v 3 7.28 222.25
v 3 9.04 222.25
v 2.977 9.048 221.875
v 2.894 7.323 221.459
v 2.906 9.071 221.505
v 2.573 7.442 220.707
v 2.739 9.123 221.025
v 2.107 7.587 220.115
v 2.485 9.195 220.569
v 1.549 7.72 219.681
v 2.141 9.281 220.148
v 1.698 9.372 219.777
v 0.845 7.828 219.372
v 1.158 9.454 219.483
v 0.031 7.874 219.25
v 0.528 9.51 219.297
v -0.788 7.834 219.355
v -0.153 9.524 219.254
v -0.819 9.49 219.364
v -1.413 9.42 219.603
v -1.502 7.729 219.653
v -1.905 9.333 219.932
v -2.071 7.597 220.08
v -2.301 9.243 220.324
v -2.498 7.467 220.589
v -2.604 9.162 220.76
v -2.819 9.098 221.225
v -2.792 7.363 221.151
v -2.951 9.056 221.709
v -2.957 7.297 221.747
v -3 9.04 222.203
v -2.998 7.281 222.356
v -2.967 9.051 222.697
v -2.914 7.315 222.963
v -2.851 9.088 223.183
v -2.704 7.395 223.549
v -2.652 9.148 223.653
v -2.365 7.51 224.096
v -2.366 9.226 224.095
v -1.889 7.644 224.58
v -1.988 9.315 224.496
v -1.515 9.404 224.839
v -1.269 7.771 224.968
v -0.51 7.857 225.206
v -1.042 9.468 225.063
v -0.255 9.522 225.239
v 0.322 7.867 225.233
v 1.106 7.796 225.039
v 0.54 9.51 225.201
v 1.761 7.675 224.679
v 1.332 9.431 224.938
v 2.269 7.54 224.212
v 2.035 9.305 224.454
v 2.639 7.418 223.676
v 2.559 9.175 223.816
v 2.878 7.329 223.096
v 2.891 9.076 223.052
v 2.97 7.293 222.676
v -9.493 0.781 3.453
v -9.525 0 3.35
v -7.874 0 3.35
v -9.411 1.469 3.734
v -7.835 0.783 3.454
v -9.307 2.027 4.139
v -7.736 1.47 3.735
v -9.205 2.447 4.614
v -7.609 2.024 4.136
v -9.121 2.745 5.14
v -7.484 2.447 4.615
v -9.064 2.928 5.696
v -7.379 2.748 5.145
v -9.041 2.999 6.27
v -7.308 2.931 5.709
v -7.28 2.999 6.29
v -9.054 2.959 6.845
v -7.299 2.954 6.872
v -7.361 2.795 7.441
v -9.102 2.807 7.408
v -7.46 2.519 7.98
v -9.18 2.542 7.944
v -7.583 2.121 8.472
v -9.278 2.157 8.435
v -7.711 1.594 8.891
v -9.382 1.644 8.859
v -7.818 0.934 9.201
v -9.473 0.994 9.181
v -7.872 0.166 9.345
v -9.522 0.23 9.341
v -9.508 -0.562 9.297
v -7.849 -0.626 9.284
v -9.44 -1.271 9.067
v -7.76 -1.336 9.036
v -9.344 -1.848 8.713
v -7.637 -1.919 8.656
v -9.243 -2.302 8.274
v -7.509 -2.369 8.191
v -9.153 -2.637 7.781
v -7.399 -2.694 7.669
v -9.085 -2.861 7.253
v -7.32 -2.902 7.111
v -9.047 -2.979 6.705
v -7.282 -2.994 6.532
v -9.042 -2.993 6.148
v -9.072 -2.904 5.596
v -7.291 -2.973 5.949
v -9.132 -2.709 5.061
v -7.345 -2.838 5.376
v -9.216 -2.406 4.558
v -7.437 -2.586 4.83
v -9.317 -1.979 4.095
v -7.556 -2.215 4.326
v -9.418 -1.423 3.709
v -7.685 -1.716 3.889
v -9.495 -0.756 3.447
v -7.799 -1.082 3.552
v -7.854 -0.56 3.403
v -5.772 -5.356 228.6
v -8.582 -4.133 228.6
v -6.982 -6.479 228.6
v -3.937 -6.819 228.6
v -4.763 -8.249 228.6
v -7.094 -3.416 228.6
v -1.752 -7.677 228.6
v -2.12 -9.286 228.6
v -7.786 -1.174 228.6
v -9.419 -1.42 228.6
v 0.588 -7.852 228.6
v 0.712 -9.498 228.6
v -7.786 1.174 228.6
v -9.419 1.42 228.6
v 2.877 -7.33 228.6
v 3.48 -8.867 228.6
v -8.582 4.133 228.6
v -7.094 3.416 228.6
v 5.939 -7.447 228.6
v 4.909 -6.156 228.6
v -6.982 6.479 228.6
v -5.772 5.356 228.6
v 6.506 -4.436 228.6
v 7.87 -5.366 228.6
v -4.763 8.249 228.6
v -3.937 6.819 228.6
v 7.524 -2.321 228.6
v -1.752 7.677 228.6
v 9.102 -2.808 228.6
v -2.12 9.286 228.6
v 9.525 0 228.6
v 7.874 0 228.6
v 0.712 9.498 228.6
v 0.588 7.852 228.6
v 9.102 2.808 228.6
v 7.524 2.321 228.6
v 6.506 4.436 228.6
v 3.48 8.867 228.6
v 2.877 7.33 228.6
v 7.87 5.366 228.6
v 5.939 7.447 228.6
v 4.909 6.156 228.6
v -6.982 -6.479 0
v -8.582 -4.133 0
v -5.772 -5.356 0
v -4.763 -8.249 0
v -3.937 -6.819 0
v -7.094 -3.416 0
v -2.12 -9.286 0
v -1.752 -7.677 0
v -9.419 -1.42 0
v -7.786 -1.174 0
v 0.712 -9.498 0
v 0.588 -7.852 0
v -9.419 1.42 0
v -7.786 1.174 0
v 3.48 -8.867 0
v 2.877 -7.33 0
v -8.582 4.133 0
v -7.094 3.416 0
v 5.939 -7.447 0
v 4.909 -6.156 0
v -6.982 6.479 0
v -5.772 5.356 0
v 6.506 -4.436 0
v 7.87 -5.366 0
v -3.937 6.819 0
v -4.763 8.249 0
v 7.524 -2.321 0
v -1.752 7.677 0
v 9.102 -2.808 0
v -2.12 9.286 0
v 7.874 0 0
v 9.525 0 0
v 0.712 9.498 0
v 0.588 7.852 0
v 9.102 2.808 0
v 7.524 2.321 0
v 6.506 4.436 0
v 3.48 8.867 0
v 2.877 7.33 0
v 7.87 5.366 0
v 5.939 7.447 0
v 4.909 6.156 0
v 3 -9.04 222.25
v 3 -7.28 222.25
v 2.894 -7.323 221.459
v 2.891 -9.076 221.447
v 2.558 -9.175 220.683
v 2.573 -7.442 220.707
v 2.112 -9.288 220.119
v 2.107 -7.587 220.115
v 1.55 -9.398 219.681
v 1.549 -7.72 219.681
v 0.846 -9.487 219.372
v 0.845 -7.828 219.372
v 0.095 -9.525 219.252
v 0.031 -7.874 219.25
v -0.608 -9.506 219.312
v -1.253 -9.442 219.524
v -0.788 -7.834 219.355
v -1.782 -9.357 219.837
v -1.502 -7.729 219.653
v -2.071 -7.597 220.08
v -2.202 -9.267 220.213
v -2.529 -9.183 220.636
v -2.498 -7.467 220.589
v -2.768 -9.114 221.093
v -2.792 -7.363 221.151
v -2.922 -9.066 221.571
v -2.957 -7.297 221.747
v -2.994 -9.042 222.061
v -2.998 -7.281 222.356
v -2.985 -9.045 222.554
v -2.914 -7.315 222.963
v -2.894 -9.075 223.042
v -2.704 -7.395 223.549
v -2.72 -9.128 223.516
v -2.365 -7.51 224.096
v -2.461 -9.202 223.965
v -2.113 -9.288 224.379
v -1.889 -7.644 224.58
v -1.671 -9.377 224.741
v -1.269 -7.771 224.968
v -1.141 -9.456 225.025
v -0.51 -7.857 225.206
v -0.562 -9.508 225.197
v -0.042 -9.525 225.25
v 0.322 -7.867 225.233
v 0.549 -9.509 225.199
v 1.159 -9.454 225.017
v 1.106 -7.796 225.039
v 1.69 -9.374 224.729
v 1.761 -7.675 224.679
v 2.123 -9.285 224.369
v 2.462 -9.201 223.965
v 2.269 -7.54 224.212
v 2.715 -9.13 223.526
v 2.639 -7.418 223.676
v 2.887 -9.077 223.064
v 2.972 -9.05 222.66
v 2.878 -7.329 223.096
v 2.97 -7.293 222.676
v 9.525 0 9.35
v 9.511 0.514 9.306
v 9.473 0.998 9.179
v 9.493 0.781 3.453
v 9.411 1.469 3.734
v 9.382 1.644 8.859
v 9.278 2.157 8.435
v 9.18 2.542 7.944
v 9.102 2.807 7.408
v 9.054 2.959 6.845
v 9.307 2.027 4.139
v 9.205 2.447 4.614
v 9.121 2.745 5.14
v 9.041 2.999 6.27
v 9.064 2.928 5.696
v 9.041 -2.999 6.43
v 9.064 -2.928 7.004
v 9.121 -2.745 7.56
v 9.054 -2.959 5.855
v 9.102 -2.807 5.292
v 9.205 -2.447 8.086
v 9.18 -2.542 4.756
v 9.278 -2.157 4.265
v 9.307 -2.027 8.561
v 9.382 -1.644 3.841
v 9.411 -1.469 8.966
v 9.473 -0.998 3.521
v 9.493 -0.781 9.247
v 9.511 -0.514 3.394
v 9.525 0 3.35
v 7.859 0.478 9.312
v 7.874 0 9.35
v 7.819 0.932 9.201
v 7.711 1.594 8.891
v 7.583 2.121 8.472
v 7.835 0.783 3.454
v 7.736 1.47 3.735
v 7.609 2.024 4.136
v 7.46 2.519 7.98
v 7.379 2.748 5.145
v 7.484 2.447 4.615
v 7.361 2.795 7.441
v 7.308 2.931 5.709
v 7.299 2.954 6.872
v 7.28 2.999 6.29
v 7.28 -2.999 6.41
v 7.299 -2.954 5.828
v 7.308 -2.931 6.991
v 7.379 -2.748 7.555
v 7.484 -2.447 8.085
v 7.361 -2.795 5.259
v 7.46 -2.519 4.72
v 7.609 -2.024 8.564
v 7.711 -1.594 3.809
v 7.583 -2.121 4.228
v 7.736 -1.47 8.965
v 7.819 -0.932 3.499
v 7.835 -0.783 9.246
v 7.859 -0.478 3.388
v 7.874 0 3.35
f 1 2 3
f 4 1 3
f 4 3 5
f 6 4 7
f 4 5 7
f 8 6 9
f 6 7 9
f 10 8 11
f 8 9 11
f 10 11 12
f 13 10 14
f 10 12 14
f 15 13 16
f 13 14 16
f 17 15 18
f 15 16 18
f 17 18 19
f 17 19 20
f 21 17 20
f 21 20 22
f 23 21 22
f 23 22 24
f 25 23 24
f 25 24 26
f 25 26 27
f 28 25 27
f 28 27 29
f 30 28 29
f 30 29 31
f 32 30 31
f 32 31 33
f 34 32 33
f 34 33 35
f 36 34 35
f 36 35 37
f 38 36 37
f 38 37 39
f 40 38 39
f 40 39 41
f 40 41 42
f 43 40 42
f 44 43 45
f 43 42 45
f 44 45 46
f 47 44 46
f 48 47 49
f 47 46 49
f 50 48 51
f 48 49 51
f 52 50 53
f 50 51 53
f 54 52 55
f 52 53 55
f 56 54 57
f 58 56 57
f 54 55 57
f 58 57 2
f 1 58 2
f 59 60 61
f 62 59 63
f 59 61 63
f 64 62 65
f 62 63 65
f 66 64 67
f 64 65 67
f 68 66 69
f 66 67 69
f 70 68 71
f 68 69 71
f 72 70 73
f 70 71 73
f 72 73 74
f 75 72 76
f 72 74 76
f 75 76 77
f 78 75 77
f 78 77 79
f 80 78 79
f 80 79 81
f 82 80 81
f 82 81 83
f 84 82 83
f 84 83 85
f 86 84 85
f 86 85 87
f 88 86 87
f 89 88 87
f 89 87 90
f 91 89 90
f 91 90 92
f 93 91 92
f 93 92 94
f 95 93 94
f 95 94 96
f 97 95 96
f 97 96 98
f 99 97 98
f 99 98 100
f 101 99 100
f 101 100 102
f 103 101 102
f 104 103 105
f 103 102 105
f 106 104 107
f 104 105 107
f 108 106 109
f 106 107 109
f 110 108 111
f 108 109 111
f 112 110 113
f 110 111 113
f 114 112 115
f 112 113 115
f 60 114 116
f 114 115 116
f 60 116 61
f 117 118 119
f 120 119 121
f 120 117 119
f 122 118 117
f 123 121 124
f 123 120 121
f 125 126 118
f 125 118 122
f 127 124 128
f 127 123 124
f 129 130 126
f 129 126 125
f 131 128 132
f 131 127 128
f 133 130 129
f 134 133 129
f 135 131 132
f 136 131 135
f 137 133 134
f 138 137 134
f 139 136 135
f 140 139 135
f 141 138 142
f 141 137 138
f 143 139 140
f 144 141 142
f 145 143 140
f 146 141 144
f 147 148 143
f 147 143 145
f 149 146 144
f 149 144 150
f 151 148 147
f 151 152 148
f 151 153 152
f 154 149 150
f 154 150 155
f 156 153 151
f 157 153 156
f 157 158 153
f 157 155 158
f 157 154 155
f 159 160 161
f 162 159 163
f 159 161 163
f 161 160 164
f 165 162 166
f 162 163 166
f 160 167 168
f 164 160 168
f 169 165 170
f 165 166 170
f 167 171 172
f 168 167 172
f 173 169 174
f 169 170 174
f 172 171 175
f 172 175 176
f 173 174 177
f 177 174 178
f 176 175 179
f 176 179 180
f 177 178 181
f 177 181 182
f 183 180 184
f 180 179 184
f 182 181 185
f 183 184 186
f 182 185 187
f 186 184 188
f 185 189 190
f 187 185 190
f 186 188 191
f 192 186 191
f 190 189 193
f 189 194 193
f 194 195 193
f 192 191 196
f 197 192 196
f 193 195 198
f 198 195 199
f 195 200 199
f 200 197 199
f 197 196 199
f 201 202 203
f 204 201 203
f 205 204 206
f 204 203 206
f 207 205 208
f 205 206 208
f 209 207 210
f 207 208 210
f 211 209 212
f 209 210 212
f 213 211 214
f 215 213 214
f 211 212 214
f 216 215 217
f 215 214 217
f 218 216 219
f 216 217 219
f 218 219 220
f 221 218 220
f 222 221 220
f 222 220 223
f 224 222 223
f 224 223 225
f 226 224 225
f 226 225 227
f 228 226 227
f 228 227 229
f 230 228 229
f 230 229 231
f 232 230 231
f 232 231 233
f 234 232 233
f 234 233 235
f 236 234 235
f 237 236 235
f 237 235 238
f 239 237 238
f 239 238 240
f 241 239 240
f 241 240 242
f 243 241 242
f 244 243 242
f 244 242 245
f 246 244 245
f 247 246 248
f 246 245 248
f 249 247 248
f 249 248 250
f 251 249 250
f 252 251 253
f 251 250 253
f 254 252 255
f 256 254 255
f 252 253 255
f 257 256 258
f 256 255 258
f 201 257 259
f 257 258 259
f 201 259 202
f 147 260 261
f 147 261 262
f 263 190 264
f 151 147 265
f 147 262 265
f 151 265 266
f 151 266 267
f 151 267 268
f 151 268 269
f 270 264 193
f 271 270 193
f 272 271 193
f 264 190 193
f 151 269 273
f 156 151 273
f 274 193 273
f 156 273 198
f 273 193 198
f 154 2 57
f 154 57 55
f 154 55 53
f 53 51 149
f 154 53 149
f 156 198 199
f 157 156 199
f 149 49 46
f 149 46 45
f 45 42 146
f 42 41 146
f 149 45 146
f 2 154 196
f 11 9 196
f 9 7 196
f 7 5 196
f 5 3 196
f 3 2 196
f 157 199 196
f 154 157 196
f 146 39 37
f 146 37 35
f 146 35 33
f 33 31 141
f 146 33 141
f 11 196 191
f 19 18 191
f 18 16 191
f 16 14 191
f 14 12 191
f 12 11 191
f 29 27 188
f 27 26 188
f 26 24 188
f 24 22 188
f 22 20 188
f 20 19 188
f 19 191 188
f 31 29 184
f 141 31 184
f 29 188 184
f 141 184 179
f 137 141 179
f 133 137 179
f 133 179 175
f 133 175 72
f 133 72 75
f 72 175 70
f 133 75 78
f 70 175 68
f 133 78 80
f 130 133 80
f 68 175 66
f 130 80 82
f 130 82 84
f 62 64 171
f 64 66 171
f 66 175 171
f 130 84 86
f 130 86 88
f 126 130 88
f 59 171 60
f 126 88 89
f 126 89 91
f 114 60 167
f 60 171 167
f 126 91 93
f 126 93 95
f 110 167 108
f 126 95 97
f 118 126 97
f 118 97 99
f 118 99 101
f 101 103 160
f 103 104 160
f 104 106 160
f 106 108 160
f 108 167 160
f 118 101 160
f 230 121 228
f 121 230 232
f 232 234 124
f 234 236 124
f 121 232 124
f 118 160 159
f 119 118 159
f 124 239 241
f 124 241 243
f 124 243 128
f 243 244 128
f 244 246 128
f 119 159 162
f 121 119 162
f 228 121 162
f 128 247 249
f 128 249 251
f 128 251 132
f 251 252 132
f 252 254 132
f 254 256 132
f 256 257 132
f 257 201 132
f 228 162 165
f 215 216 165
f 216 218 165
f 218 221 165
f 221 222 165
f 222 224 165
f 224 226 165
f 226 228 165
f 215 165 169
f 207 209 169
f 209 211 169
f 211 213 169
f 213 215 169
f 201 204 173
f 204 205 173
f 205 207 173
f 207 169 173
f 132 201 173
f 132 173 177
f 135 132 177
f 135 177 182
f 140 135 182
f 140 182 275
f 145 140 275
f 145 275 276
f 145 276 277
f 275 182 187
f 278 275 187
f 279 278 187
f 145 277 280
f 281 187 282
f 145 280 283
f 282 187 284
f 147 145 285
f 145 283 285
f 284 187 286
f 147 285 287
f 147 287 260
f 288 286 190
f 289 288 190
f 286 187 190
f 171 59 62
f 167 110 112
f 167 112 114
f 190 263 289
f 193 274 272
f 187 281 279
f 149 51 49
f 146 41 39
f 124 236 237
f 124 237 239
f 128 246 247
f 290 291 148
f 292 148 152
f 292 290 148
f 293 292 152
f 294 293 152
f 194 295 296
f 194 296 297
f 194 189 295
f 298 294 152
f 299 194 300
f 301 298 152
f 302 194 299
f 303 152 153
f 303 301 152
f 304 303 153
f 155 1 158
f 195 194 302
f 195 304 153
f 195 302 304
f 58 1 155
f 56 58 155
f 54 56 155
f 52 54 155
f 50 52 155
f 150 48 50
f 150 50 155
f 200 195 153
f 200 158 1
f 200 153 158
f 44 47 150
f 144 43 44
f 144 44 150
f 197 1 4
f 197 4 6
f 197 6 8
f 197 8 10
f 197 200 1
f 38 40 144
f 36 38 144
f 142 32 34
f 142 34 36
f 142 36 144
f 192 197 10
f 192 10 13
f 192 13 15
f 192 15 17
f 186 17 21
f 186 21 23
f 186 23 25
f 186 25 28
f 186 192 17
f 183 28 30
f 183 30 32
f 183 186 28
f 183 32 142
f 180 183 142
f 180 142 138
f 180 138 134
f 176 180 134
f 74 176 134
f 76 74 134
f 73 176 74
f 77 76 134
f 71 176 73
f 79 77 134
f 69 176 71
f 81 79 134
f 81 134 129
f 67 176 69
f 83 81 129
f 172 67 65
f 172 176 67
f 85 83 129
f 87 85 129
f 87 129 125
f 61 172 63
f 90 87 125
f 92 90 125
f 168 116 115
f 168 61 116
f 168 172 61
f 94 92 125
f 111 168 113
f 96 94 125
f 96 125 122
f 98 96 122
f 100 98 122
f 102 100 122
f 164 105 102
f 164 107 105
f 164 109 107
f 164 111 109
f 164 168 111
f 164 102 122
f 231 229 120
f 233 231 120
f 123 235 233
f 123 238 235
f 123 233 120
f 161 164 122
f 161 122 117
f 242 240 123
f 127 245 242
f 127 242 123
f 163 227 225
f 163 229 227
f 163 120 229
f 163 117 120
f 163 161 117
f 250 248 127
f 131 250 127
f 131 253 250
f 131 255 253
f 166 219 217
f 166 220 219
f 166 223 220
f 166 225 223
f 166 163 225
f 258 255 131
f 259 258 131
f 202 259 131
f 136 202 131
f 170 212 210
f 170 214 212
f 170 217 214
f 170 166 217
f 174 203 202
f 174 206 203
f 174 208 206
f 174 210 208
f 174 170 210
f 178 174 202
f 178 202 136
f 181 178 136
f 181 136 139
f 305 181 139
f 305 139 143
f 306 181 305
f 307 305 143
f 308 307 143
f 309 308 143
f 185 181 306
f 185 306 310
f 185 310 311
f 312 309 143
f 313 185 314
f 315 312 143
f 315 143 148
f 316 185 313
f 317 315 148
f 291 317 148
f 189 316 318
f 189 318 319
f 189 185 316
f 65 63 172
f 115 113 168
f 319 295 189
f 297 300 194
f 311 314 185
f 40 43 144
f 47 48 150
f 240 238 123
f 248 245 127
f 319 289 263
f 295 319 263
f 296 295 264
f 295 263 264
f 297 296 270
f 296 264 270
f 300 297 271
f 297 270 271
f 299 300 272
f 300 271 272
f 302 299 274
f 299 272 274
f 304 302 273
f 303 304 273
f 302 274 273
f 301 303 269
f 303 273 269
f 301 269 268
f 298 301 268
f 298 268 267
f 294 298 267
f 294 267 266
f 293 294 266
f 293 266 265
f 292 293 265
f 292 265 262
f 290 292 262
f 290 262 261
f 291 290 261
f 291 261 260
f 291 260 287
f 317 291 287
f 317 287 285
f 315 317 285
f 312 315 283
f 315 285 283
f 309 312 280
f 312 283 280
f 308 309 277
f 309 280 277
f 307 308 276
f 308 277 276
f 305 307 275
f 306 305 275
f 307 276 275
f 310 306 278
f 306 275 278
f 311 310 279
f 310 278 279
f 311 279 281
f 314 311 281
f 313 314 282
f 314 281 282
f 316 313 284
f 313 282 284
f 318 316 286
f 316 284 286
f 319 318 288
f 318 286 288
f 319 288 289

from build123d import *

# Parameters (mm, degrees)
SKETCH1_R           = 9.525
SKETCH1_R_2         = 7.874
BOSS_EXTRUDE1_DEPTH = 228.6
SKETCH2_R           = 3
CUT_EXTRUDE1_DEPTH  = 138.80592
SKETCH3_R           = 3
CUT_EXTRUDE2_DEPTH  = 138.80592


with BuildPart() as part:
    # Sketch1 → Boss-Extrude1 (new body)
    with BuildSketch(Plane.XY):
        Circle(SKETCH1_R)
        Circle(SKETCH1_R_2, mode=Mode.SUBTRACT)
    extrude(amount=BOSS_EXTRUDE1_DEPTH)

    # Sketch2 → Cut-Extrude1 (cut)
    with BuildSketch(Plane(origin=(0, 9.525, 0), x_dir=(1, 0, 0), z_dir=(0, 1, 0))):
        with Locations((0, -222.25)):
            Circle(SKETCH2_R)
    extrude(amount=-CUT_EXTRUDE1_DEPTH, mode=Mode.SUBTRACT)

    # Sketch3 → Cut-Extrude2 (cut)
    with BuildSketch(Plane(origin=(9.525, 0, 0), x_dir=(0, 0, -1), z_dir=(1, 0, 0))):
        with Locations((-6.35, 0)):
            Circle(SKETCH3_R)
    extrude(amount=-CUT_EXTRUDE2_DEPTH, mode=Mode.SUBTRACT)


solid = part.part
